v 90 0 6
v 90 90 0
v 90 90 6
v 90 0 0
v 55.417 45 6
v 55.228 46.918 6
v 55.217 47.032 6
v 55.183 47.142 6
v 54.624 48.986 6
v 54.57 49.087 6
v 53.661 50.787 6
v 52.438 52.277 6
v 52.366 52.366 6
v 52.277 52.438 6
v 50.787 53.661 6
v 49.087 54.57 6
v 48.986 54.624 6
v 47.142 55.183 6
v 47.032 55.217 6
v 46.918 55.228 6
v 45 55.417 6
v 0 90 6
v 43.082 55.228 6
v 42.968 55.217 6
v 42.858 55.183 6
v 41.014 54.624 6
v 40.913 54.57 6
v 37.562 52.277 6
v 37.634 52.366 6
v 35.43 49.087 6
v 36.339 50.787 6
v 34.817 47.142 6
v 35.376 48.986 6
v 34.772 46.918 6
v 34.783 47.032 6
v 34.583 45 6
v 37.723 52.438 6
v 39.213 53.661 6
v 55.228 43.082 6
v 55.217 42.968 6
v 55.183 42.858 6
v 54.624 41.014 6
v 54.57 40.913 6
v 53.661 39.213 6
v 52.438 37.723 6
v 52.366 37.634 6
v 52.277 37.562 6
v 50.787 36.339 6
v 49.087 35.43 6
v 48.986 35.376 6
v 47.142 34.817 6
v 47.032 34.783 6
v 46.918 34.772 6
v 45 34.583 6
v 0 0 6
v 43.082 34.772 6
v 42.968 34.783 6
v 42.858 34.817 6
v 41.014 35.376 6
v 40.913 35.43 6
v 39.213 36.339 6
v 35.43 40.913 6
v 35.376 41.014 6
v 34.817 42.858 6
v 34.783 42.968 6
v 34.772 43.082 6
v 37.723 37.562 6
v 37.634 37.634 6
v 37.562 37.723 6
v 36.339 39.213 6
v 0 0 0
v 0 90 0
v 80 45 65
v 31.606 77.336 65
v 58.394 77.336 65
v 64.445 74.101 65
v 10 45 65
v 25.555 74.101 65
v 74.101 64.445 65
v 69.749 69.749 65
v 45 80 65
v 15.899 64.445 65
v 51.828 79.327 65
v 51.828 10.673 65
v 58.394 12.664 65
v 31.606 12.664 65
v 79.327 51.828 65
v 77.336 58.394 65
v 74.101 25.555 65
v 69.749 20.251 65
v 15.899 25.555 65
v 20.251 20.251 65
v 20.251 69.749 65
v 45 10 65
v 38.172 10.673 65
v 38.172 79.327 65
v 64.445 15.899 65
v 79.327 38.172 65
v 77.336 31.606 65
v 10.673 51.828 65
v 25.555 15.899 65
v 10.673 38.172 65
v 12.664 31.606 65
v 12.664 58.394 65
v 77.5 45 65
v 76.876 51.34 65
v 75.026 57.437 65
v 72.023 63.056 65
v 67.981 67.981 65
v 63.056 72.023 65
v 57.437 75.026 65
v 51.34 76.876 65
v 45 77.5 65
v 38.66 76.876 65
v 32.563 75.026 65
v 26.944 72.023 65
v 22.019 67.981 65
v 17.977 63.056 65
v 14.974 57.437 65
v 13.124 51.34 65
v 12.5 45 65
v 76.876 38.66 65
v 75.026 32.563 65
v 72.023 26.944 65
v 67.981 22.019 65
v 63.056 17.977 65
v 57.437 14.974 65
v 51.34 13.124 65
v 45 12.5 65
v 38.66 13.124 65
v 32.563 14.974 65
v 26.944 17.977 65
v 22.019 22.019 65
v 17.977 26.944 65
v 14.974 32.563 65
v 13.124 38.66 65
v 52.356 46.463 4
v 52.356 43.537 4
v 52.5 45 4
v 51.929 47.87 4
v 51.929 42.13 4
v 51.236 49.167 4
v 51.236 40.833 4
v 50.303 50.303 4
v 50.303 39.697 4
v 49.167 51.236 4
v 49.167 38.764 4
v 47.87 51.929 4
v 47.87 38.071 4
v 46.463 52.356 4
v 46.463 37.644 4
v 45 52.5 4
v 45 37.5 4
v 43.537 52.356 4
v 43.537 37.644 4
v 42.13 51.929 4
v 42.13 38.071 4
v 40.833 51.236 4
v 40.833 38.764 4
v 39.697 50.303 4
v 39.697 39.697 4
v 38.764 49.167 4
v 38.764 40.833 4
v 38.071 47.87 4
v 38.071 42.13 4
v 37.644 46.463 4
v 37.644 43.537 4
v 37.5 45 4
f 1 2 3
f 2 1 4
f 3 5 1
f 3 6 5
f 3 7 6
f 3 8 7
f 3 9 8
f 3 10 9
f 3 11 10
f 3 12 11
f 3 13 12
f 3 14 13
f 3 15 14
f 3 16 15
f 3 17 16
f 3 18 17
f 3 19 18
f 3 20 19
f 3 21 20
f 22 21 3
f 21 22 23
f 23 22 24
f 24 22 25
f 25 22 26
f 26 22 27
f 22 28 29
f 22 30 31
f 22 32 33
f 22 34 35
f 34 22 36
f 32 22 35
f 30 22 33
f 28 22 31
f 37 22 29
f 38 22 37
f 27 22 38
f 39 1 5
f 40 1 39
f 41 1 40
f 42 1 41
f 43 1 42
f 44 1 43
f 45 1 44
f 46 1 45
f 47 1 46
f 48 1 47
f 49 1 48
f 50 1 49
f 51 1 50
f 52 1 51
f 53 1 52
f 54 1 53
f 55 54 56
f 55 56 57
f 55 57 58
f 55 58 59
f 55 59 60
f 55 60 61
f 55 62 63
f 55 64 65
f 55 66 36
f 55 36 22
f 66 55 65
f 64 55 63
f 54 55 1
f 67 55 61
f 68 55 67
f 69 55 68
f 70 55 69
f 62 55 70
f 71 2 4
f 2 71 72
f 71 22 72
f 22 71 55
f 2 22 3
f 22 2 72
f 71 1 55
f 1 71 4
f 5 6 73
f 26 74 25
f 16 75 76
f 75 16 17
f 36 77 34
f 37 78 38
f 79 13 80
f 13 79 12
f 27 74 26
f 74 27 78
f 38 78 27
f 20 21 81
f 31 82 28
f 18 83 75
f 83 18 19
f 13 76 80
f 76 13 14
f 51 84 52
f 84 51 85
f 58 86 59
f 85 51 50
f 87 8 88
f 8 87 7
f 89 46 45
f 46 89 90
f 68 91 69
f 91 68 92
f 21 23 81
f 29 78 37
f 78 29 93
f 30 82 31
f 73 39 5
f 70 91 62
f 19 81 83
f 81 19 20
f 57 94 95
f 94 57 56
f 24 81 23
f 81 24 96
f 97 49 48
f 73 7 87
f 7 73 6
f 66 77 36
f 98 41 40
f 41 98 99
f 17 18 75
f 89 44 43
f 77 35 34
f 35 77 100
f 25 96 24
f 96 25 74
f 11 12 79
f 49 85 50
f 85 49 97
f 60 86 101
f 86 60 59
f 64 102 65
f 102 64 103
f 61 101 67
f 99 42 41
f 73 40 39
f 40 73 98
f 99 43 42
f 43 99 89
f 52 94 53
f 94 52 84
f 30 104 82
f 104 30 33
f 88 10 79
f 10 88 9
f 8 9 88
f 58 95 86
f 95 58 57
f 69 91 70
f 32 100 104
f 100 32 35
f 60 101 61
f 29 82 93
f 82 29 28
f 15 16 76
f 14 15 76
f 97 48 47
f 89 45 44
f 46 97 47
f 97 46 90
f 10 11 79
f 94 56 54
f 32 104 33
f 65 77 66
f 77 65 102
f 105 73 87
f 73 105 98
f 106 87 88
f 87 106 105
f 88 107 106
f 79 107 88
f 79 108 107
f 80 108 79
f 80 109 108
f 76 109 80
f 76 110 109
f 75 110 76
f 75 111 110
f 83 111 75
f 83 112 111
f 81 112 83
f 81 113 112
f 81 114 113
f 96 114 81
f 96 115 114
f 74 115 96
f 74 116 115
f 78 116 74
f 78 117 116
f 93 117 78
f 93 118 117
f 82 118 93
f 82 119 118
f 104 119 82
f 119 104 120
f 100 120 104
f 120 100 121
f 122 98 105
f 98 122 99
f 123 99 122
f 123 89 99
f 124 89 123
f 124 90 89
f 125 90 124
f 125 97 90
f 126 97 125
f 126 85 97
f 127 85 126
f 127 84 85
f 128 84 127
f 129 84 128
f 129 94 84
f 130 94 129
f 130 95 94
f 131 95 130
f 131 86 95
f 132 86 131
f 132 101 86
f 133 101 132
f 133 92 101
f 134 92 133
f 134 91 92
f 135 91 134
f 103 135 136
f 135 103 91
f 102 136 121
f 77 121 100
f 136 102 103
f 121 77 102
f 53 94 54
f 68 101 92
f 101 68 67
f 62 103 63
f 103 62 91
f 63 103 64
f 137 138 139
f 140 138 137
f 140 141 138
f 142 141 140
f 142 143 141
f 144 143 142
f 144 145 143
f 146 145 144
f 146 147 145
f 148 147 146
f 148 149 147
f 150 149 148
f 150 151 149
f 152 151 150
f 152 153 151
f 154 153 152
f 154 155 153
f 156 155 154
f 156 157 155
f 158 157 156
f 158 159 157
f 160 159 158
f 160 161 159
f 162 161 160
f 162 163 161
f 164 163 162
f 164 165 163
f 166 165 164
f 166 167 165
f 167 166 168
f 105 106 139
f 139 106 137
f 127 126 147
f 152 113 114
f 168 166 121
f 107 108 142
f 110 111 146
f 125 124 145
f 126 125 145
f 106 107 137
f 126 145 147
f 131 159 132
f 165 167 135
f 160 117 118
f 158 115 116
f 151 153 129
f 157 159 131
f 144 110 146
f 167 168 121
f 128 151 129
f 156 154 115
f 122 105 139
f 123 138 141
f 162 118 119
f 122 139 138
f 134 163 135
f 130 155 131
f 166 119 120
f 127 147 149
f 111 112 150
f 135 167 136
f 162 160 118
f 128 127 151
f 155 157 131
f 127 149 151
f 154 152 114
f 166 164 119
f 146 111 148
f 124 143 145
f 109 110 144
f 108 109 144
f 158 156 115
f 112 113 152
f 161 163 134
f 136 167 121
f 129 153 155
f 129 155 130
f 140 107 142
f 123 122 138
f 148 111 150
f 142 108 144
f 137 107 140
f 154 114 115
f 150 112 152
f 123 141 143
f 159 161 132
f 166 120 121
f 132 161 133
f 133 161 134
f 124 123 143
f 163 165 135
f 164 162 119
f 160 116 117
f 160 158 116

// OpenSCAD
$fn = 32;

// ----------------------------------------------------------------------
// Hopper: funnel with square flange
// ----------------------------------------------------------------------

// --- parameters (mm) ---
fl = 90;                  // flange side, X and Y
fl_t = 6;                 // flange thickness
cone_h = 60;              // cone height above the flange
top_d = 70;               // cone mouth diameter
bot_d = 20;               // cone spout diameter
wall = 2.5;               // cone wall thickness

bore_d = bot_d - 2 * wall;  // spout bore diameter
total_h = fl_t + cone_h - 1;  // overall height

difference() {
  union() {
    cube([fl, fl, fl_t]);
    translate([fl / 2, fl / 2, fl_t - 1])
      cylinder(h = cone_h, d1 = bot_d, d2 = top_d);
  }
  translate([fl / 2, fl / 2, fl_t - 2])
    cylinder(h = cone_h + 1, d1 = bore_d, d2 = top_d - 2 * wall);
}
